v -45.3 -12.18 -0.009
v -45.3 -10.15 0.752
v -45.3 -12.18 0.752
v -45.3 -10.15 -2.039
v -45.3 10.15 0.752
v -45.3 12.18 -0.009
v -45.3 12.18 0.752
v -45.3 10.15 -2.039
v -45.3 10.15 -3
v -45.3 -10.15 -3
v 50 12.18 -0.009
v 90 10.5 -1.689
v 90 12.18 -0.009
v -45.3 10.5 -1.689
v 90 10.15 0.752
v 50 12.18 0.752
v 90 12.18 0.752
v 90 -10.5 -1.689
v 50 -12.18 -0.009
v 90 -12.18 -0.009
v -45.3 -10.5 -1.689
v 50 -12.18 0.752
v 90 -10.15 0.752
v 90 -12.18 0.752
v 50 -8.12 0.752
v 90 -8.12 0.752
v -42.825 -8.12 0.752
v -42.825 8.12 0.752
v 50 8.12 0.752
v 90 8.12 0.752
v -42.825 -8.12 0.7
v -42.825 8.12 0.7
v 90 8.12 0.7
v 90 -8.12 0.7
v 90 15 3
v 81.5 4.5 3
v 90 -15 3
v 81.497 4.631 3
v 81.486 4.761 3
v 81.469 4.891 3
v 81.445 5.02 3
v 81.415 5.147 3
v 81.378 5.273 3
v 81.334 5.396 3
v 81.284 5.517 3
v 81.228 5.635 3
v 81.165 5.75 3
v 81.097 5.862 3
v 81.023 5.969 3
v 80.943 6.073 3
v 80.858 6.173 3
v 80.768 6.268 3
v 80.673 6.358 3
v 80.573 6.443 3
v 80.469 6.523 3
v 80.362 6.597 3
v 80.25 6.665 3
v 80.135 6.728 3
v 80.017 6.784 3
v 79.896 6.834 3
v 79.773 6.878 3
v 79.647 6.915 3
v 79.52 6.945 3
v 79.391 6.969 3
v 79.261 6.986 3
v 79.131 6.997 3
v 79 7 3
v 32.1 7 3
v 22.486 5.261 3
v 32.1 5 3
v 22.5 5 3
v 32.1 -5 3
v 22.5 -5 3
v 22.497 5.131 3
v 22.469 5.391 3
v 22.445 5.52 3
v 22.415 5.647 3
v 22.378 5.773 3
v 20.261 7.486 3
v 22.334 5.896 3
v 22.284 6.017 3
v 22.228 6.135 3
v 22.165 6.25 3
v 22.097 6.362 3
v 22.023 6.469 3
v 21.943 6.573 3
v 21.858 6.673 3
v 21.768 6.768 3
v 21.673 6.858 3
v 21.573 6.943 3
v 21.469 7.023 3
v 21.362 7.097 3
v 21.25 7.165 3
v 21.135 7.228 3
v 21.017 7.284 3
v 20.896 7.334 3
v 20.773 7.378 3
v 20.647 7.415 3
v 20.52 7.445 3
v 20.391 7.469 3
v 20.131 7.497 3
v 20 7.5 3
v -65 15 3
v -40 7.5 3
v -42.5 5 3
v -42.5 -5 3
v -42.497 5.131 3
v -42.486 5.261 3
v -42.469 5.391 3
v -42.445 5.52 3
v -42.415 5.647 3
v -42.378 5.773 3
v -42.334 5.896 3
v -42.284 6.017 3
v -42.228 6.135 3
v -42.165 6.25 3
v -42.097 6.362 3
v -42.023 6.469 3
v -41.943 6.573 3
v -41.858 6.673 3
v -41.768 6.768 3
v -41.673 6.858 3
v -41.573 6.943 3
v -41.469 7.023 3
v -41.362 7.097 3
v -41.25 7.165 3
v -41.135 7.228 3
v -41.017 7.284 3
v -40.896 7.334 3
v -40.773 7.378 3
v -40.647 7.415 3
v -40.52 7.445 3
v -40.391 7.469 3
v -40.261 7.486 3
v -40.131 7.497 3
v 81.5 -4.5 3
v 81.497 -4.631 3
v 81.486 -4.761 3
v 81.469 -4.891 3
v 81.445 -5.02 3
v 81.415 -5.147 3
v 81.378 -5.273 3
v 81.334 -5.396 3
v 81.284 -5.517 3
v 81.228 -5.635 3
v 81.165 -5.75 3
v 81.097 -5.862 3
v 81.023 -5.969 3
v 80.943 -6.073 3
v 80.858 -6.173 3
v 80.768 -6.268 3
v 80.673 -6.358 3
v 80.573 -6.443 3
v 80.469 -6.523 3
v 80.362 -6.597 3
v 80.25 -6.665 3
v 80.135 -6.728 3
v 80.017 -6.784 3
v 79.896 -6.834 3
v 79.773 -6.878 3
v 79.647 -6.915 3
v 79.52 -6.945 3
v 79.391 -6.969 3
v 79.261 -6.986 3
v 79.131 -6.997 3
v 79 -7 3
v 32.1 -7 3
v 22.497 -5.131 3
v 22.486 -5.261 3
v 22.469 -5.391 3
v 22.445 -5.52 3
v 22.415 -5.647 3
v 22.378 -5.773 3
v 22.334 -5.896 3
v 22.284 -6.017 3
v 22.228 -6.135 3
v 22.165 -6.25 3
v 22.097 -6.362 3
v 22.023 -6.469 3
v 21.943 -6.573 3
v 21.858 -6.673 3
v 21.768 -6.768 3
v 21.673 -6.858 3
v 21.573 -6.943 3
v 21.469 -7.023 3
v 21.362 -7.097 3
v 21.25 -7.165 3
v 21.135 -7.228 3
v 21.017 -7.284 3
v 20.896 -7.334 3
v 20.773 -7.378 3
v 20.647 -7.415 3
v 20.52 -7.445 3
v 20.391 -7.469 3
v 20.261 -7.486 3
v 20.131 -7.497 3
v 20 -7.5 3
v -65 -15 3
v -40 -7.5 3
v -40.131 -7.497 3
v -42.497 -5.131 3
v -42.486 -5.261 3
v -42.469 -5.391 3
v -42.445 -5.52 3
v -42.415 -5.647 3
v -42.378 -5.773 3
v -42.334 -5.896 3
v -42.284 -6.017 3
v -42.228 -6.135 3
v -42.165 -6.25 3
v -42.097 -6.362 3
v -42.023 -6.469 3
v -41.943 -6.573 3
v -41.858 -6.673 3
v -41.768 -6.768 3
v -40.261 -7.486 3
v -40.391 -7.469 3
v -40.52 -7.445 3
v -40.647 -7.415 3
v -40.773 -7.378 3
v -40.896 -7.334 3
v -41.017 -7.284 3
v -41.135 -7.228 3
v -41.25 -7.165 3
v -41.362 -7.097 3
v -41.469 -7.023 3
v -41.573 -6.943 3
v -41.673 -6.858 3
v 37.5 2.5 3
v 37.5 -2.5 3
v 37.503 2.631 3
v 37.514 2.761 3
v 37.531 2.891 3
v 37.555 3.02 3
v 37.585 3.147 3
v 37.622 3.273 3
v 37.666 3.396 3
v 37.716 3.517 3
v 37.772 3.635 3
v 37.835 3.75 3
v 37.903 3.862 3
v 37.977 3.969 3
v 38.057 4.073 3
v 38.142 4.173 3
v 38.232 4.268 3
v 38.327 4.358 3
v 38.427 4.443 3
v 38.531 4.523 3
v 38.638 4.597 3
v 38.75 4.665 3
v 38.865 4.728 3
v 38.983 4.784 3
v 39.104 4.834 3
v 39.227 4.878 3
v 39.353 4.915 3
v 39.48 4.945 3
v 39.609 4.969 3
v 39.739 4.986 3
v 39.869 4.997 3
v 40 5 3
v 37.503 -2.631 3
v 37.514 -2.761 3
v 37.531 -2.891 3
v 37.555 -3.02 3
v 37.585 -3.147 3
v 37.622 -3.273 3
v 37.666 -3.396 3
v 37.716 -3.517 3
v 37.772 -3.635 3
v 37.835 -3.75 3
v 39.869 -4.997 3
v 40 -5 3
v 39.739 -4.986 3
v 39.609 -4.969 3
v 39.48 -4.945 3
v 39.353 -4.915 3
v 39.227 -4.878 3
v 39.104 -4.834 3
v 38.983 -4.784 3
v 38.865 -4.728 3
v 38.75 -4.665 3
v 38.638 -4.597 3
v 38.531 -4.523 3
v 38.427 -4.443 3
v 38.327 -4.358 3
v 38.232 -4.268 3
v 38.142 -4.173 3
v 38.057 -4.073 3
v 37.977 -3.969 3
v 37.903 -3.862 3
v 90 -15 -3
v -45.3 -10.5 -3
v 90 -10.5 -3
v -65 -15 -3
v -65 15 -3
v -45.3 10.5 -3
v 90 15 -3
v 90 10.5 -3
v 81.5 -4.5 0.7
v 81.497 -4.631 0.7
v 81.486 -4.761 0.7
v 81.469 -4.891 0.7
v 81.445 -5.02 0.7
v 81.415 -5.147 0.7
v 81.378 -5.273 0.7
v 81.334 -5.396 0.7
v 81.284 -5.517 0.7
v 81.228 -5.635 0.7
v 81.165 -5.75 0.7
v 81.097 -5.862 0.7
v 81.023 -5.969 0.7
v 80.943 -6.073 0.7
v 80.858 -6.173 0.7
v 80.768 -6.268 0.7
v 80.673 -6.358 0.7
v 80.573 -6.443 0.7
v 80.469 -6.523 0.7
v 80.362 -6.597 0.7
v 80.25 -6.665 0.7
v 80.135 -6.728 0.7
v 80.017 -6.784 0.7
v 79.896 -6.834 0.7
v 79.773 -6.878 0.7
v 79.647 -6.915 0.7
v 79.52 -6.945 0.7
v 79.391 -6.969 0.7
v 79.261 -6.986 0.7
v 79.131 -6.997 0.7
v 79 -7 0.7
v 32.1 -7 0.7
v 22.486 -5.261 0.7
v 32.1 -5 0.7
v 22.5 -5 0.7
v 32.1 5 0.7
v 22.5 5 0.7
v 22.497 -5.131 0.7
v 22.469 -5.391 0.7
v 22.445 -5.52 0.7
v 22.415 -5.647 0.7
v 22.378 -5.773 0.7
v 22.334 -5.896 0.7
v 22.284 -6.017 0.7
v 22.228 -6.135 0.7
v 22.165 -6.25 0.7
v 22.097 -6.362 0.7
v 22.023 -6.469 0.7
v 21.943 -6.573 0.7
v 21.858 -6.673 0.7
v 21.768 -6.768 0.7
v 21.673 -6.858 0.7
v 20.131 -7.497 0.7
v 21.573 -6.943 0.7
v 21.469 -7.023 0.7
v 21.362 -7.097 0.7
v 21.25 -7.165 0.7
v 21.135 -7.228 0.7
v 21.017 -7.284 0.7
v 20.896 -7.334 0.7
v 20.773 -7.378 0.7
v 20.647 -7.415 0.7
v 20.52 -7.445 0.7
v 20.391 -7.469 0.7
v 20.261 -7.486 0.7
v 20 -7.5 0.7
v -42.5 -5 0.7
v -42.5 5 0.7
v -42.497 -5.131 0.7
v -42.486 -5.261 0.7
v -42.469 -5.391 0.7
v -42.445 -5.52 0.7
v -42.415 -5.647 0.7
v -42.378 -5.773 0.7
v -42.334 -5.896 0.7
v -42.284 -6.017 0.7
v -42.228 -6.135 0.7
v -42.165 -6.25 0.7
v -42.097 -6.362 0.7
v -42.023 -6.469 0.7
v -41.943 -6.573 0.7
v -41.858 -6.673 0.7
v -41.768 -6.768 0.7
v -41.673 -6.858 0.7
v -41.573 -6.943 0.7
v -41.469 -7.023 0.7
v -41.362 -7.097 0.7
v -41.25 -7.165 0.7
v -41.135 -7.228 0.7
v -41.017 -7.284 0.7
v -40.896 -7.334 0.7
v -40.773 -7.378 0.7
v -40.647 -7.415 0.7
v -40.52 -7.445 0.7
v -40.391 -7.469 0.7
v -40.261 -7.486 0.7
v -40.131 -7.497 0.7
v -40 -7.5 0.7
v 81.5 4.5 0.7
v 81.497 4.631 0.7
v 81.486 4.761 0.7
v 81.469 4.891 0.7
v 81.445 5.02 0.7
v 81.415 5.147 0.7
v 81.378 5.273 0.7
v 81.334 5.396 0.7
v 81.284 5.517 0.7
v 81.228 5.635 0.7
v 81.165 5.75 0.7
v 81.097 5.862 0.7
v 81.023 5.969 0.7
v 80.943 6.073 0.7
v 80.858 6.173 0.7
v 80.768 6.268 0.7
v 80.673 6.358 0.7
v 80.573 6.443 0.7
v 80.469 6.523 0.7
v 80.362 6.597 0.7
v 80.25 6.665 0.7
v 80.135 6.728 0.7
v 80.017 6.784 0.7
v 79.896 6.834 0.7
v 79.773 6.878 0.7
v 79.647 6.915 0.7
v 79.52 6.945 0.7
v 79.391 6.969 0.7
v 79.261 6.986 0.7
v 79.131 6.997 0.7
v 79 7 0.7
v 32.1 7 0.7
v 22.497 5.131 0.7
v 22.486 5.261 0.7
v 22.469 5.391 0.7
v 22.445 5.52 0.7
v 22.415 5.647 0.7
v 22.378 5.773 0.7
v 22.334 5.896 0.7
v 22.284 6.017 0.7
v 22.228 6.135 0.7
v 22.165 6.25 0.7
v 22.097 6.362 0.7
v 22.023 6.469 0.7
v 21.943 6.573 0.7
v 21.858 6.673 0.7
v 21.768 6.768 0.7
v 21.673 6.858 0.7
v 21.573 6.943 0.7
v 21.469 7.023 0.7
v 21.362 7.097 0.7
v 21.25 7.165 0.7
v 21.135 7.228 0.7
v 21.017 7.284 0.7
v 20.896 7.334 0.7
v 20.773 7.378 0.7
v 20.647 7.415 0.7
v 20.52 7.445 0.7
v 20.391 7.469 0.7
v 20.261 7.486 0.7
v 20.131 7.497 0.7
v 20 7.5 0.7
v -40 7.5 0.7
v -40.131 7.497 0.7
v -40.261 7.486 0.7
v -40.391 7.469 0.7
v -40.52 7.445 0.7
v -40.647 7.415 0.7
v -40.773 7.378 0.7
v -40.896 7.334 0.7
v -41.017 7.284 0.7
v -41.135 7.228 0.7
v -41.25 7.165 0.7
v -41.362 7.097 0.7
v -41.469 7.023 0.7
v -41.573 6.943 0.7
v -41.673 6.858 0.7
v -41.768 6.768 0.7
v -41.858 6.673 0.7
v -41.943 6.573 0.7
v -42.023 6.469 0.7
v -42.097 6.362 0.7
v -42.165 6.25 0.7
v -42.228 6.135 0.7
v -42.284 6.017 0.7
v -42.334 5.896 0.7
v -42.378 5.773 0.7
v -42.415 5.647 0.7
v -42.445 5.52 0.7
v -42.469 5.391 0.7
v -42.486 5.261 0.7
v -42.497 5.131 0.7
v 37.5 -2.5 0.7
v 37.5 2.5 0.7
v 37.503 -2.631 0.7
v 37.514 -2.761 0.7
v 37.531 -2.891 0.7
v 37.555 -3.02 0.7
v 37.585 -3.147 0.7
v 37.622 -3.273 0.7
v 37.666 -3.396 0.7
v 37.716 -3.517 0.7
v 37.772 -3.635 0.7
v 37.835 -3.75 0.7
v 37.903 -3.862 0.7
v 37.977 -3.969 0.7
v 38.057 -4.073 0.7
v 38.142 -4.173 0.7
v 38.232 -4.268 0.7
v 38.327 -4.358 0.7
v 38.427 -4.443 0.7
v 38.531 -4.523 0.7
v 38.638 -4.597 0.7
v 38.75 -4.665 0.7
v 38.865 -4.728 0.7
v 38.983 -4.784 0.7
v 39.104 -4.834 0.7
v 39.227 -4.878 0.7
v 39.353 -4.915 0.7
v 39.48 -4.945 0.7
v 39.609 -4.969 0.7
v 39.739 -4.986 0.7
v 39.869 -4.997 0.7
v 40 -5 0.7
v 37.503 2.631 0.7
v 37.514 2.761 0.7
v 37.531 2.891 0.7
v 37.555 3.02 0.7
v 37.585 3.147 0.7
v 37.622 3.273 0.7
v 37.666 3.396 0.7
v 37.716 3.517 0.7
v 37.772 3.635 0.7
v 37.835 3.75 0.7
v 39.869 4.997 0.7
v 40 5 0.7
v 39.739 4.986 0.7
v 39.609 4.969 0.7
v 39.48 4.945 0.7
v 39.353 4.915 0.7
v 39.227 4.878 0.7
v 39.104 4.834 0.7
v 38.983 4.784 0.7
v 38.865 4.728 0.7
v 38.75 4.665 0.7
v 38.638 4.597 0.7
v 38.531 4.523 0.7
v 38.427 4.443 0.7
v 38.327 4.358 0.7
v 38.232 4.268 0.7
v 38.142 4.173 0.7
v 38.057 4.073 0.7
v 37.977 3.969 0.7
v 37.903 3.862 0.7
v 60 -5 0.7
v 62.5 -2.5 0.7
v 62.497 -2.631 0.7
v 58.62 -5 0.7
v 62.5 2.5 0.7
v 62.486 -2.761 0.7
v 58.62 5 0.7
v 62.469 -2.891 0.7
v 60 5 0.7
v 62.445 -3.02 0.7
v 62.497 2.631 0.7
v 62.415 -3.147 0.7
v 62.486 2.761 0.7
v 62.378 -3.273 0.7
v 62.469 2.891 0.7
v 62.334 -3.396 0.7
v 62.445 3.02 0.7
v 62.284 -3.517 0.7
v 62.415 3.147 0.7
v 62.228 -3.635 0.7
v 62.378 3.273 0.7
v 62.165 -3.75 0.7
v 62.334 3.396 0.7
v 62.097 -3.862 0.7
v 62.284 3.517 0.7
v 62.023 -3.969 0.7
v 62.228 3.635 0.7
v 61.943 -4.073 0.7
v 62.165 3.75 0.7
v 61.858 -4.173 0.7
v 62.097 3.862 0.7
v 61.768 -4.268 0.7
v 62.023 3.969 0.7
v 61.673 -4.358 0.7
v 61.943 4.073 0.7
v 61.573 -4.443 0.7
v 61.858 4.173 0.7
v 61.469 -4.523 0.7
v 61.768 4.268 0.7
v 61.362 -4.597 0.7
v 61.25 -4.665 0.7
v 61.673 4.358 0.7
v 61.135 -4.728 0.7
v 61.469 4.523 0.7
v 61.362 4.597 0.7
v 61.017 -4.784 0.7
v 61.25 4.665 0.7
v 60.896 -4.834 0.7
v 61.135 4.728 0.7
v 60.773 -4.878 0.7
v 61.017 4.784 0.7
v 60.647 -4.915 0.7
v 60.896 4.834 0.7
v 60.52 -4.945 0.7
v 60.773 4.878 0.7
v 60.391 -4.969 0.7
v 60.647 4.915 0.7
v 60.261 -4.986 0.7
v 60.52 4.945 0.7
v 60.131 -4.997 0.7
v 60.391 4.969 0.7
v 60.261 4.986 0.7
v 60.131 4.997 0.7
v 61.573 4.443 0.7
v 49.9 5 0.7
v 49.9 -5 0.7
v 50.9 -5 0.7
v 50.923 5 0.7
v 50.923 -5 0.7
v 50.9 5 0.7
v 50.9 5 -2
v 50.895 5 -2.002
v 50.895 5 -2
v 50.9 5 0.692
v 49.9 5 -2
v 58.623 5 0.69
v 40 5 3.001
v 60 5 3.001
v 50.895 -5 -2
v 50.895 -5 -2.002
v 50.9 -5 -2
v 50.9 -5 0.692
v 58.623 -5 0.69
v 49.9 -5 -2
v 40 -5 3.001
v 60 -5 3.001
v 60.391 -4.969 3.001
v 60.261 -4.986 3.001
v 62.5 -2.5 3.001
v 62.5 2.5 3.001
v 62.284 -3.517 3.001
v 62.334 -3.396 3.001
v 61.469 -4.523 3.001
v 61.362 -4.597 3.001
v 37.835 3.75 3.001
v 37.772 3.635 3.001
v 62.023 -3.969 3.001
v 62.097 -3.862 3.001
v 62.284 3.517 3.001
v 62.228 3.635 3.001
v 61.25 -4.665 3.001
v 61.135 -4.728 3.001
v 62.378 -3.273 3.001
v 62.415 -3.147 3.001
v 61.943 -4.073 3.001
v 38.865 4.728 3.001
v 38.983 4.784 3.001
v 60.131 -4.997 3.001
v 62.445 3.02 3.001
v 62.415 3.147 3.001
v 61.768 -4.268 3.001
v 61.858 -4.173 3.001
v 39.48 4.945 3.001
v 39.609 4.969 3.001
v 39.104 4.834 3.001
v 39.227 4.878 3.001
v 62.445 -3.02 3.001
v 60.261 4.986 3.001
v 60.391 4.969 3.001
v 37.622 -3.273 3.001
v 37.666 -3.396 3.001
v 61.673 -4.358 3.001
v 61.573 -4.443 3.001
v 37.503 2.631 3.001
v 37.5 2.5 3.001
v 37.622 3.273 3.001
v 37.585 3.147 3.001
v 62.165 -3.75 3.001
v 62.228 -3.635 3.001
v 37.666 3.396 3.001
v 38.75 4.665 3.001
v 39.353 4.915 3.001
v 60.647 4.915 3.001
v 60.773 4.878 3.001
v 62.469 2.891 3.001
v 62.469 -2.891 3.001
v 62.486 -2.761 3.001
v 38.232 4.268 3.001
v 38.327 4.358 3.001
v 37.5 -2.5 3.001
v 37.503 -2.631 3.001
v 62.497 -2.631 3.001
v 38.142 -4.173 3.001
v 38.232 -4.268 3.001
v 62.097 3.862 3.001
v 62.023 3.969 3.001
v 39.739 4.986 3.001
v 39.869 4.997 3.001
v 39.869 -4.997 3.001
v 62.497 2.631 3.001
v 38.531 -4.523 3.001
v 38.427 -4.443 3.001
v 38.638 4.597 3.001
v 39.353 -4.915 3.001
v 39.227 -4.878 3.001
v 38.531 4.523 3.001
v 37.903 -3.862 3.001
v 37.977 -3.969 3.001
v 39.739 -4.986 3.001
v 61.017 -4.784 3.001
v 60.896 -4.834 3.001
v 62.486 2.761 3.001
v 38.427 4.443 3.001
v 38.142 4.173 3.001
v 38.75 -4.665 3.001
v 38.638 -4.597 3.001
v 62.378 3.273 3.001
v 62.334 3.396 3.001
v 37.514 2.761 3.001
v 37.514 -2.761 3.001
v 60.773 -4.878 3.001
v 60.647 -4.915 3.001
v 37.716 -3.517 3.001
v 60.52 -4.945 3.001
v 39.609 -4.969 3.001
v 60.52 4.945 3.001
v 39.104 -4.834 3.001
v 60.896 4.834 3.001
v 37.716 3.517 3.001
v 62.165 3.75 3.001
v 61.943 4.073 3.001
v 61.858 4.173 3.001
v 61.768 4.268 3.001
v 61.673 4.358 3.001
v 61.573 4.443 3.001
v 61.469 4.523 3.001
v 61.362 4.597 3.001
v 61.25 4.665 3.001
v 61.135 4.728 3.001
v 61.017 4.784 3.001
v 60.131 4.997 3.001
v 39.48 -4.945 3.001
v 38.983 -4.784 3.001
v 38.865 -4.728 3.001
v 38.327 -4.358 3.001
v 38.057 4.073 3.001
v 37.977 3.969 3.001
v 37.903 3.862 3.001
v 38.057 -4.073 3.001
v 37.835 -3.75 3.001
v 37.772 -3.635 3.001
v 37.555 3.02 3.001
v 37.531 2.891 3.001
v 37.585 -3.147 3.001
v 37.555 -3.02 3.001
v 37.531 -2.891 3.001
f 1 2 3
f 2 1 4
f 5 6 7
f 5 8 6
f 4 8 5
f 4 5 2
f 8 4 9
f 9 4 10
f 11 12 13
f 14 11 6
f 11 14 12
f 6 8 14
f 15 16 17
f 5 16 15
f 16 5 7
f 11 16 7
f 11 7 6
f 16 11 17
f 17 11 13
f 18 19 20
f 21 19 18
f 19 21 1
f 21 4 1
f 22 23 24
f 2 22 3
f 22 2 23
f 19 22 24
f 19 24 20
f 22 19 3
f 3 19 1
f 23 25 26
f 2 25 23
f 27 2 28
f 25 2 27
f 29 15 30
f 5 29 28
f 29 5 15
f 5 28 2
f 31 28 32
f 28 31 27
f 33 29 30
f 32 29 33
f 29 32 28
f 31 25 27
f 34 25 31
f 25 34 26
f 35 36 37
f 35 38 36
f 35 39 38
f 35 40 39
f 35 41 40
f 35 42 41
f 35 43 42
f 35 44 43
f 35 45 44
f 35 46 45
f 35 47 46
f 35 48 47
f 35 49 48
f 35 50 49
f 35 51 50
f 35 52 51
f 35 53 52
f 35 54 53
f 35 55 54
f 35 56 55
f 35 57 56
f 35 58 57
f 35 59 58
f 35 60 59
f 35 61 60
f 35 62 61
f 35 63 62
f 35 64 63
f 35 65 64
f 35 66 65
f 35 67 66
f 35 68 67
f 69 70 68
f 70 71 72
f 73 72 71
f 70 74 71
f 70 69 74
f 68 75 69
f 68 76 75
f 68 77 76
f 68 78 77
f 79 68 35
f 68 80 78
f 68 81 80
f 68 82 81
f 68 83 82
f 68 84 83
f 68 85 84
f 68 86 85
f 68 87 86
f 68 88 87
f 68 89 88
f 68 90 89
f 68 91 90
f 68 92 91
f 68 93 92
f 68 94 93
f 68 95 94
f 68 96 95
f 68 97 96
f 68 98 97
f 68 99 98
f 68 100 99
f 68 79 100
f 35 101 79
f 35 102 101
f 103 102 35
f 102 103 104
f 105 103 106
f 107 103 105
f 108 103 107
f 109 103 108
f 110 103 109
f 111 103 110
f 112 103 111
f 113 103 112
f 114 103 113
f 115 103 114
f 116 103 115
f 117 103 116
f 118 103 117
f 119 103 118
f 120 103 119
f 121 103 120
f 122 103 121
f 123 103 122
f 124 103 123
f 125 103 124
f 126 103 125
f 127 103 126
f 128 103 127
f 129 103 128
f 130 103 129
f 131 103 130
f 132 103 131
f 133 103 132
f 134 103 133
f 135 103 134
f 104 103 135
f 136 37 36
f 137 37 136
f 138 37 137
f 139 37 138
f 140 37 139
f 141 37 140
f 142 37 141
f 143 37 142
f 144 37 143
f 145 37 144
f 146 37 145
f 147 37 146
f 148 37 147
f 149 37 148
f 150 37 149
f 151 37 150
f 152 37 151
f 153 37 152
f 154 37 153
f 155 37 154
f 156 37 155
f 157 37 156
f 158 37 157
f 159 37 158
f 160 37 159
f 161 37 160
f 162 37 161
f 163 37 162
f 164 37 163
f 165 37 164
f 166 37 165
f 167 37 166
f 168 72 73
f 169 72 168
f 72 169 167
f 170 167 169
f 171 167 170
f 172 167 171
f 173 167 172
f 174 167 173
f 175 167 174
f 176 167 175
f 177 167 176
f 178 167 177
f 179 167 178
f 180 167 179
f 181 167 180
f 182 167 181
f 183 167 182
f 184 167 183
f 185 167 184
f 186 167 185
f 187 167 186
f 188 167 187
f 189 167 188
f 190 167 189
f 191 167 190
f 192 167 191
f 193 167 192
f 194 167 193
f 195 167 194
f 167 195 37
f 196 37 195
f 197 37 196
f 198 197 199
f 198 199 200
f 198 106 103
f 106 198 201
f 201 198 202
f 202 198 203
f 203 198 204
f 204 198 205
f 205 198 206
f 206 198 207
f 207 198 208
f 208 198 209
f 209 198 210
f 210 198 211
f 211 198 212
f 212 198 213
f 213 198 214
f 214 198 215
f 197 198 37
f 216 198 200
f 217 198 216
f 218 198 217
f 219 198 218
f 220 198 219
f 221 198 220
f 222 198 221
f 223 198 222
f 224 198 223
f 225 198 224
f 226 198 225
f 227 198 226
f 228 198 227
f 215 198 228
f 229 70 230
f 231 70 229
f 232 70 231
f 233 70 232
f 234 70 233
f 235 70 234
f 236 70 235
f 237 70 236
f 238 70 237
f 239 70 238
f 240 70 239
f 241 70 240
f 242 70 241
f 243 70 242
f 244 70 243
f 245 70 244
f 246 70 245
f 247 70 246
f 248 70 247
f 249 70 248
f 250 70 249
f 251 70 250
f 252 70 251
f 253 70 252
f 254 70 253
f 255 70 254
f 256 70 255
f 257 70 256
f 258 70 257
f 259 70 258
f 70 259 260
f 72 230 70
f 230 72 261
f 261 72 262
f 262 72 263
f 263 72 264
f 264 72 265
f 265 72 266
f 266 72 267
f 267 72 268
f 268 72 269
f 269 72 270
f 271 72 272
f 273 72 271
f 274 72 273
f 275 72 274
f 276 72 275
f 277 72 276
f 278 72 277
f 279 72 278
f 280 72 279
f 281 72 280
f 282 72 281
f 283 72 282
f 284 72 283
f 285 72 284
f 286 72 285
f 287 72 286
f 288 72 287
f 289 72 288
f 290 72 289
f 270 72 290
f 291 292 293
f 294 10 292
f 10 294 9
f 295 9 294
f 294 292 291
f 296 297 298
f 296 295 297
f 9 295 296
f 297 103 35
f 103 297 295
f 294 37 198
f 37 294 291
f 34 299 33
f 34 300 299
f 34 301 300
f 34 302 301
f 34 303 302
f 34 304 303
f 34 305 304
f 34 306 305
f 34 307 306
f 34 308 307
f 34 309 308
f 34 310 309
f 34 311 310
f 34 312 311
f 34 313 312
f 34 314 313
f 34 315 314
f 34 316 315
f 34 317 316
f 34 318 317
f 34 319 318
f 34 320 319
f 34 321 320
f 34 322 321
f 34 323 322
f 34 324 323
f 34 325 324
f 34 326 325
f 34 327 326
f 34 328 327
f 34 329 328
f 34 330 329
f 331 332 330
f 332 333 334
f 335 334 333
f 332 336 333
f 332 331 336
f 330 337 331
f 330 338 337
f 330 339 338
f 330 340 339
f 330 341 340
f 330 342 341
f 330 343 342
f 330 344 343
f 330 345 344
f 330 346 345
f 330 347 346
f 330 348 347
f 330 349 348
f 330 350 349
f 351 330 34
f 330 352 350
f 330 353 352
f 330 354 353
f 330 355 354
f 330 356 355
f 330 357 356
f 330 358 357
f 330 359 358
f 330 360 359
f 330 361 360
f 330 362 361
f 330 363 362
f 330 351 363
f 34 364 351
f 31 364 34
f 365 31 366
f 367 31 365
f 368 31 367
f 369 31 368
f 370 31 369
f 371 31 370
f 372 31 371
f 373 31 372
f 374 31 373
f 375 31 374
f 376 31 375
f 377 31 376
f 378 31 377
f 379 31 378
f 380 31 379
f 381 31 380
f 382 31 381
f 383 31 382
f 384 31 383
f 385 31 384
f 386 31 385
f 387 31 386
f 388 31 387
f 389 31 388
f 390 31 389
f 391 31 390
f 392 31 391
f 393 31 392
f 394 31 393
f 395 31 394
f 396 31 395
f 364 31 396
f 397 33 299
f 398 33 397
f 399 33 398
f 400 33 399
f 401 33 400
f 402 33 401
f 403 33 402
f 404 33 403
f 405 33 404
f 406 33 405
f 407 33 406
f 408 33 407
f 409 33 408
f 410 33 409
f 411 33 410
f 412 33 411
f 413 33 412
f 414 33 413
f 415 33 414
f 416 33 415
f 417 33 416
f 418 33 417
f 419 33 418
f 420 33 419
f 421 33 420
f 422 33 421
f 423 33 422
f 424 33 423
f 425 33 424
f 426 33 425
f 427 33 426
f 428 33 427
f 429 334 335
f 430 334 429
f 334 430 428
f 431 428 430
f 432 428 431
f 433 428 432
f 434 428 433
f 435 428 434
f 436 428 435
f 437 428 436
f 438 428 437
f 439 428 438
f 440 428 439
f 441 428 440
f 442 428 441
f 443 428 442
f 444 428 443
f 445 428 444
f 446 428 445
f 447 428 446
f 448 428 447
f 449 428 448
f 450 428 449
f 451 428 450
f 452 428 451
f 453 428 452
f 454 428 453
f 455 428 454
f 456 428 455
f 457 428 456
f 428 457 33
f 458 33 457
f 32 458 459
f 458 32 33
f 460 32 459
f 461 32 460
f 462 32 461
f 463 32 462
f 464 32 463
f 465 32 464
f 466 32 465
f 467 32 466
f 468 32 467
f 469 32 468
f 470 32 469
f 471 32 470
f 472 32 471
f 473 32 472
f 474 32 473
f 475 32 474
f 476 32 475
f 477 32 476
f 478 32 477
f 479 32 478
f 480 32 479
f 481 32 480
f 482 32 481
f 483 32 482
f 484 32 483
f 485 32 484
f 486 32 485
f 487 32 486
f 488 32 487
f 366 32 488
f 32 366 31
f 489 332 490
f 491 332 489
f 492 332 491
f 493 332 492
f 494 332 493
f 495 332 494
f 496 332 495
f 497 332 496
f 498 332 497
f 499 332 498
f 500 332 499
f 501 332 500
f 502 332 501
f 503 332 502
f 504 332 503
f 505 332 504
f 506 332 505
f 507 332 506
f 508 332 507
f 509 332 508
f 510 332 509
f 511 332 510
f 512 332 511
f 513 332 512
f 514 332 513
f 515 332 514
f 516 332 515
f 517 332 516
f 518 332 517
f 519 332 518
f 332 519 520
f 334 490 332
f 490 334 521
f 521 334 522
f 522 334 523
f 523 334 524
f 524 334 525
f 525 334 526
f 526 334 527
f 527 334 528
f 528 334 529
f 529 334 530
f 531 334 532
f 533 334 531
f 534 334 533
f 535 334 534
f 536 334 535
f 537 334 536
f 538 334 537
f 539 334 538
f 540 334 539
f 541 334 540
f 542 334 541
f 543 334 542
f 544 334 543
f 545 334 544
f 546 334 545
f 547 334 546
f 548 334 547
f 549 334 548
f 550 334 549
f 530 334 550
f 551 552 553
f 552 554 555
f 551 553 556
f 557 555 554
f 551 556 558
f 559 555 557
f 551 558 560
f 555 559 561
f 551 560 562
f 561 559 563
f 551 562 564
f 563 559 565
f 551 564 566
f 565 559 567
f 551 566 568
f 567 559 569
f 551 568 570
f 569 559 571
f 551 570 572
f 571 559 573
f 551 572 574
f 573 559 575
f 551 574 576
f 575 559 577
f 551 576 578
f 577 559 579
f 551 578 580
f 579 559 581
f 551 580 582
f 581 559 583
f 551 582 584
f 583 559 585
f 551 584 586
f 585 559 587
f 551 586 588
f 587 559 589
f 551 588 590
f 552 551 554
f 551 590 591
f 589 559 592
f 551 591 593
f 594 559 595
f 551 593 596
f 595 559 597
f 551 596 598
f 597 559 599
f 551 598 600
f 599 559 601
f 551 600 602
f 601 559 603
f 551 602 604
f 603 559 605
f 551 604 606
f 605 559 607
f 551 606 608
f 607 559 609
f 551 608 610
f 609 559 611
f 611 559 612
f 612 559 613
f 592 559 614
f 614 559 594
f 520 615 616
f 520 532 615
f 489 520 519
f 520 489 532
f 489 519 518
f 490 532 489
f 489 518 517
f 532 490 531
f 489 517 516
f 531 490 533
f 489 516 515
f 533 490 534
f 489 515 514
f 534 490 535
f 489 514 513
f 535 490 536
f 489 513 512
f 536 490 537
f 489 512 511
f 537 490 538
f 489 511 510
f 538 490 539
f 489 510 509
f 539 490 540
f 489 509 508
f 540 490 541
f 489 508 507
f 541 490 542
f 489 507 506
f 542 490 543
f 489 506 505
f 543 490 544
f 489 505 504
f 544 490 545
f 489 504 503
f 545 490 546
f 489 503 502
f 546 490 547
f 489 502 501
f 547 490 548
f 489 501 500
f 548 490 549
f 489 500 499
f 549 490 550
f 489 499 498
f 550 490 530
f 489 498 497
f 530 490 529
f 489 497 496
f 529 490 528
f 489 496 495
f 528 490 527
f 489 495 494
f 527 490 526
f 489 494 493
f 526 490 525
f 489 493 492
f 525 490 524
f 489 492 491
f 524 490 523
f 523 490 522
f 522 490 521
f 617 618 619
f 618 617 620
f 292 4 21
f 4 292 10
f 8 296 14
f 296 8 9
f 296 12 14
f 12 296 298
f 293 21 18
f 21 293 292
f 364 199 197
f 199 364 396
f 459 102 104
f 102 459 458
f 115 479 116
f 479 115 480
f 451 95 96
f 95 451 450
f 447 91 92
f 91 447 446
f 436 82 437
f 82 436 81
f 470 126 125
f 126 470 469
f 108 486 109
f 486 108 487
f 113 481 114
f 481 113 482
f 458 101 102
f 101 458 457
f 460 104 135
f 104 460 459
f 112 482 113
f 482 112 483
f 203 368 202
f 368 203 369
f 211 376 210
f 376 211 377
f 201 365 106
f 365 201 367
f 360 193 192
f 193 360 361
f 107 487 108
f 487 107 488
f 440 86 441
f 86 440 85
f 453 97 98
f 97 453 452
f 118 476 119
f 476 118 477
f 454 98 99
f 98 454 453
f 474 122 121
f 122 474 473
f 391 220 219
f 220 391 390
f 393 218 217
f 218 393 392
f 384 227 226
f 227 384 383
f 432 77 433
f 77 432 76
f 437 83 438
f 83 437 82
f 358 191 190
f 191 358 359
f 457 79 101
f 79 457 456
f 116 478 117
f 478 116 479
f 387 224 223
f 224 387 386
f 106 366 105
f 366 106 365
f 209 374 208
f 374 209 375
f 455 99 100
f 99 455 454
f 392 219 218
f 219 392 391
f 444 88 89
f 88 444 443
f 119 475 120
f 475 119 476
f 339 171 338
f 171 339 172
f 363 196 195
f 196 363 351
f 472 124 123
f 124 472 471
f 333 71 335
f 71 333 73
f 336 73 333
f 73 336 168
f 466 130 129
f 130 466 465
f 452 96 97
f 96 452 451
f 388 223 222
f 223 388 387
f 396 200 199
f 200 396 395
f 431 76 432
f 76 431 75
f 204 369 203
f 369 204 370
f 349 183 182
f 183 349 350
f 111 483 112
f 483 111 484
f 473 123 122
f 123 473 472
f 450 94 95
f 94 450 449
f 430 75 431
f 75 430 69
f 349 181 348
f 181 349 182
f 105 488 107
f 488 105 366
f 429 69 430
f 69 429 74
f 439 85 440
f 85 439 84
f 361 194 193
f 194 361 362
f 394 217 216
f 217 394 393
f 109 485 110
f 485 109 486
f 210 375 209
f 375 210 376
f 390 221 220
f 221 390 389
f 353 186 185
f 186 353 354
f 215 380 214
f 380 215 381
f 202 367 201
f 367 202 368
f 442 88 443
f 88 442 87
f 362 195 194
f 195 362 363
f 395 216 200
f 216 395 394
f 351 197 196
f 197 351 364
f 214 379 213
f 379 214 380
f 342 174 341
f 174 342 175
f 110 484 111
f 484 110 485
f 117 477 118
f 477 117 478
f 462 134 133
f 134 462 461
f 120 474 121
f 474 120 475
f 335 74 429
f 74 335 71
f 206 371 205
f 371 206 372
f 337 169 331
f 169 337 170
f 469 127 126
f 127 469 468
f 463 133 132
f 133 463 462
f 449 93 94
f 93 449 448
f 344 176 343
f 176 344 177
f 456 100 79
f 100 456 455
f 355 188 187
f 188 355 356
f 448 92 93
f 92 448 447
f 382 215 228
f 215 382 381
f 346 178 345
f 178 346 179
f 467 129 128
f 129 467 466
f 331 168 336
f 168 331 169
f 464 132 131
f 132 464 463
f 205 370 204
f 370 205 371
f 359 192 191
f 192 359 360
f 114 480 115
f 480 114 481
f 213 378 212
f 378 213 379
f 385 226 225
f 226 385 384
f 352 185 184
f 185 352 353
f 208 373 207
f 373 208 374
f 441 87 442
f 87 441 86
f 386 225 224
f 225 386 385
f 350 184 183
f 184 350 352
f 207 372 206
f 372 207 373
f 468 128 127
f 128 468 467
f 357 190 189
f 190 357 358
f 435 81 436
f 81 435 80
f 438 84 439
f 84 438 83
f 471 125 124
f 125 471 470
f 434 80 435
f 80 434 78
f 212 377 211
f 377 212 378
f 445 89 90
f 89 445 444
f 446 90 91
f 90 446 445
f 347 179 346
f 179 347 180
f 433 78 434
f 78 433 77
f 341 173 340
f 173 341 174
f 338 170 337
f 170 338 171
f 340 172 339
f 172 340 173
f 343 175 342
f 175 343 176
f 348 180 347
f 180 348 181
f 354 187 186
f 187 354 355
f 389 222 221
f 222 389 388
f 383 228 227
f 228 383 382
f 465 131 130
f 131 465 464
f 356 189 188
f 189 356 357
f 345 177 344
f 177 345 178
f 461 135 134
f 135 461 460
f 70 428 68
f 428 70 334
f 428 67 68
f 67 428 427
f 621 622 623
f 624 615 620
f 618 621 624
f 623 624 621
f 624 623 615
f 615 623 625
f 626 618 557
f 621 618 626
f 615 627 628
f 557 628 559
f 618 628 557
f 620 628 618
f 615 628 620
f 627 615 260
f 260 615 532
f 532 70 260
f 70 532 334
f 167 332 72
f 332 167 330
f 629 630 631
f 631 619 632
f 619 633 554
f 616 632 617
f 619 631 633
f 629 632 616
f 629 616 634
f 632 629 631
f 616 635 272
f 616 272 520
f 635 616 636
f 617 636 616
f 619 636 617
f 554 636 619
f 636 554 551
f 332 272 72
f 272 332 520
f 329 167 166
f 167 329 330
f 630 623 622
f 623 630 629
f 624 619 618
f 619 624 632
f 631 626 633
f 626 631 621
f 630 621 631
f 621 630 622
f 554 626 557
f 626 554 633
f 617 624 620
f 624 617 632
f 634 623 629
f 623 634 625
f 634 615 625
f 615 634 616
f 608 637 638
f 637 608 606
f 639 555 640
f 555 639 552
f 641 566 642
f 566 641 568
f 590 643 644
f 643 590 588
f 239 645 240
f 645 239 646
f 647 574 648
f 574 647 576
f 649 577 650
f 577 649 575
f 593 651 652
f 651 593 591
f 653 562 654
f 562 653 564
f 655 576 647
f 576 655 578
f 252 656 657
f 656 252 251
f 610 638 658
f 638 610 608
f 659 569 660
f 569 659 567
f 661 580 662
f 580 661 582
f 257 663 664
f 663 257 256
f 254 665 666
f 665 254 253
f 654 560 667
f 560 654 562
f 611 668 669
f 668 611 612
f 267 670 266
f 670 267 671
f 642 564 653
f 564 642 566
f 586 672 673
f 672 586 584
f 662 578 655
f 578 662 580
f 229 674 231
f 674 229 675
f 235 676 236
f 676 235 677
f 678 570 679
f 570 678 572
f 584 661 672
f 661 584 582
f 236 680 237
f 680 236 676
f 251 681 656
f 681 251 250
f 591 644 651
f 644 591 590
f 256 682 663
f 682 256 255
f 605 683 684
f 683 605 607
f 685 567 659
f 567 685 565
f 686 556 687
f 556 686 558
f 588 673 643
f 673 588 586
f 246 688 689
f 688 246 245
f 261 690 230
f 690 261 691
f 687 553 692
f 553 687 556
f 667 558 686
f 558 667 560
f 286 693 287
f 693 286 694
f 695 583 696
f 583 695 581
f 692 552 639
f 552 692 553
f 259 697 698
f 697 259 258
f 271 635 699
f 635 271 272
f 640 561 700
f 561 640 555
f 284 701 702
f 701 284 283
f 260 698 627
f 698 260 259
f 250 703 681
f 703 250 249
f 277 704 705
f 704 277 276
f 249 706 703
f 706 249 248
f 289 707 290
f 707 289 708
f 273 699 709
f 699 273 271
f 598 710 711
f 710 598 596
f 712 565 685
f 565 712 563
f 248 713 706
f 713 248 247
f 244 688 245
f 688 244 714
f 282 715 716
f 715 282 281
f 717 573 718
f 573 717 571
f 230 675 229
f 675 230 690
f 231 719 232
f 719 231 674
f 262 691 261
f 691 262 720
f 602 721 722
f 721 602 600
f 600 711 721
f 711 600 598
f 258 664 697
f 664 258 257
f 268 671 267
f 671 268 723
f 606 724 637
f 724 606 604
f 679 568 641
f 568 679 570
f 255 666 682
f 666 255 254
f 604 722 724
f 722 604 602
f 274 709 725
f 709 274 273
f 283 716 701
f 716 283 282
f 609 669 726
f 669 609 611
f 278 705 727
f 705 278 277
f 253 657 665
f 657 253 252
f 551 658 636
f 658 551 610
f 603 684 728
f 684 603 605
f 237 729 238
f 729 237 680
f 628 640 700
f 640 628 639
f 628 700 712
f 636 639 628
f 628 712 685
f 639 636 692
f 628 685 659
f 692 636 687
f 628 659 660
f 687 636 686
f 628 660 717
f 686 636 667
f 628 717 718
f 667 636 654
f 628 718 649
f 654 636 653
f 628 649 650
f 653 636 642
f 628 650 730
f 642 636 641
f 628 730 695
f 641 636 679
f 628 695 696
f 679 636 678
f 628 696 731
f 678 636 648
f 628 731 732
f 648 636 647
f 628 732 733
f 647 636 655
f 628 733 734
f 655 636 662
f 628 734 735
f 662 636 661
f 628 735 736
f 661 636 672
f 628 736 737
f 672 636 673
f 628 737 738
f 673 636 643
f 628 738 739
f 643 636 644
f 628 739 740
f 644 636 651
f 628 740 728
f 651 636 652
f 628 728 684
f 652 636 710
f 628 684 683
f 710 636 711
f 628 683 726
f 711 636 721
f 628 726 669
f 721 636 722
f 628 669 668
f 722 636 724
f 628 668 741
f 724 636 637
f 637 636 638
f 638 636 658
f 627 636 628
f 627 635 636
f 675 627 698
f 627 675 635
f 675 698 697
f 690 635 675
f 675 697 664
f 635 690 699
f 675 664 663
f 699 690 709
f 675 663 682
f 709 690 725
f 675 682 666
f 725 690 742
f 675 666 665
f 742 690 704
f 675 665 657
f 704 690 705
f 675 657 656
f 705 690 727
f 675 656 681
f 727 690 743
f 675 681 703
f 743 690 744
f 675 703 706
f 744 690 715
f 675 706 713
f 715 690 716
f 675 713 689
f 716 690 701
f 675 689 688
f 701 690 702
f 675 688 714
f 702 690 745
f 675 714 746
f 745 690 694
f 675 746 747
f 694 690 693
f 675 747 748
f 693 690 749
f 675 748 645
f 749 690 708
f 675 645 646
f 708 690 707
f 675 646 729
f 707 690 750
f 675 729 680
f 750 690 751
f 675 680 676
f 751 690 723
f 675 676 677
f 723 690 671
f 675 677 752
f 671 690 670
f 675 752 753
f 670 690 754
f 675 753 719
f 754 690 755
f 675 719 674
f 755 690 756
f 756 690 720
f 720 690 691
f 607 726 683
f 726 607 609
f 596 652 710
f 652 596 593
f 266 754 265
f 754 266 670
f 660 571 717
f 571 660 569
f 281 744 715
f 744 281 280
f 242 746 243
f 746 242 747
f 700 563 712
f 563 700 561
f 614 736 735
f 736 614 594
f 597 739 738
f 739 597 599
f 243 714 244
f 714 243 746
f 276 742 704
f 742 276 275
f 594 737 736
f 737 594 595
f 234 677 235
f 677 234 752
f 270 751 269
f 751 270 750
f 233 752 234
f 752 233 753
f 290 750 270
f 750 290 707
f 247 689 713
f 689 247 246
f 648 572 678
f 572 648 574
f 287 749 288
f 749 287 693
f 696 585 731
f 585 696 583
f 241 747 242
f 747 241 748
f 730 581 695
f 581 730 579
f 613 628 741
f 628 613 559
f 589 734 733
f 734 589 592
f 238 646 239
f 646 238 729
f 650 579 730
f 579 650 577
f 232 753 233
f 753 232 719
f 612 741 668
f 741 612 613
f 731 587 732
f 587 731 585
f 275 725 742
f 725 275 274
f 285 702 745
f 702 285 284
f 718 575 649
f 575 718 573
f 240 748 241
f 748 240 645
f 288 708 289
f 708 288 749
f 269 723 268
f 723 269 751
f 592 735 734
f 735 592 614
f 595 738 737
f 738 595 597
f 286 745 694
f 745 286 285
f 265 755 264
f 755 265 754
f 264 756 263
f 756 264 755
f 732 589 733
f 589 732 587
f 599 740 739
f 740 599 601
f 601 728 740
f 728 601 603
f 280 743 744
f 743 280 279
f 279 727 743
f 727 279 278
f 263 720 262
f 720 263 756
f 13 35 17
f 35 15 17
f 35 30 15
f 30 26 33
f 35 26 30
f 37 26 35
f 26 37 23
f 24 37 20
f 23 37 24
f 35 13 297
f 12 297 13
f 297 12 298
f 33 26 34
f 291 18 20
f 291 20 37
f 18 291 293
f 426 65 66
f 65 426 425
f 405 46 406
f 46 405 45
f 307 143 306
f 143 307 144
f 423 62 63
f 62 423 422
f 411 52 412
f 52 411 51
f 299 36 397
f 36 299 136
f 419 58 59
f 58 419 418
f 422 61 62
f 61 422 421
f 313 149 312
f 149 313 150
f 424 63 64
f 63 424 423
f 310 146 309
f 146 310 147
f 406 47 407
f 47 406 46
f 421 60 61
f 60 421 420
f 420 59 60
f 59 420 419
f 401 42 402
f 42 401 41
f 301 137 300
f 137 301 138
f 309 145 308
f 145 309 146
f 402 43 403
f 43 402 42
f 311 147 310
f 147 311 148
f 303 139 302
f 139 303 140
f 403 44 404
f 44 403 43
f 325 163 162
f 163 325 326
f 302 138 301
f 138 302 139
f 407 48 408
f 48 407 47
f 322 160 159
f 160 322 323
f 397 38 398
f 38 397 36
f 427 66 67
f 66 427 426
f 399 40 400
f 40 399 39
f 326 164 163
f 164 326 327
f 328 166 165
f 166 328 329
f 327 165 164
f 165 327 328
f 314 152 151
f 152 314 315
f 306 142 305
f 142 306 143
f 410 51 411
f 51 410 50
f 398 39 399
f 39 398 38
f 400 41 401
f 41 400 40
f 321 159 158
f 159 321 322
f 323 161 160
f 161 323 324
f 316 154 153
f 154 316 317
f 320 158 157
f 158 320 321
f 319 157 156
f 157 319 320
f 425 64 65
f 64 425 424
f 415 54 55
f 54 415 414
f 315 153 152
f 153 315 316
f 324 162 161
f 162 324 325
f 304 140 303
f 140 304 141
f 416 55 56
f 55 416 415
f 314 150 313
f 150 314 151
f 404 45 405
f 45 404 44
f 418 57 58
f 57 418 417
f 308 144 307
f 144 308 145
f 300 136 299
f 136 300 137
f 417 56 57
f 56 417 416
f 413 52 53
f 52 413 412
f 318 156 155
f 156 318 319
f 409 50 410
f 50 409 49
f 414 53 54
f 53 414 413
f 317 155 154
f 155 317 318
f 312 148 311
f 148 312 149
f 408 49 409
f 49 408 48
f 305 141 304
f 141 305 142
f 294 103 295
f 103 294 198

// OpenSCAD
$fn = $preview ? 45 : 120;

bolt = 5; // M5
hammock_mount();
//hammock_clamp_top();
//hammock_clamp_bottom();

//#translate([55, 0, -2.8]) frame_mount();
//frame_mount();
//spacer();

module hammock_mount() {
    width = 120;
    diameter = 100;
    
    removable_mount();
    
    translate([-57, 0, 0]) cube([16, 30, 6], true);
    translate([70, 0, 0]) difference() {
        cube([40, 30, 6], true);
        translate([-20, 0, -2.8]) scale([1.1, 1.015, 1.015]) frame_mount(false, false);
        translate([0, 0, -1.8]) cube([50, 21, 5], true);
        translate([-6, 0, 1]) minkowski() {
            cube([30, 9, 5], true);
            cylinder(d = 5, h = 1);
        }
    }
    
}
    
module hammock_clamp_top() {
    difference() {
        translate([0, 0, 0]) {
            cube([16, 38, 11], true);
            translate([-8, 0, -50]) rotate([0, 90, 0]) difference() {
                cylinder(d = 100, h = 16);
                translate([0, 0, -1]) cylinder(d = 94, h = 18);
                translate([0, -50, -1]) cube([200, 100, 20]);
                translate([-5, -75, 3]) cube([2, 140, 10]);
            }
        }
        translate([14, 0, 0]) scale([1.01, 1.01, 1.01]) #cube([40, 30, 6], true);
    }
}

module hammock_clamp_bottom() {
    difference() {
        translate([0, 0, 0]) {
            cube([16, 40, 12], true);
            translate([-8, 0, -50]) rotate([0, 90, 0]) difference() {
                cylinder(d = 100, h = 16);
                translate([0, 0, -1]) cylinder(d = 94, h = 18);
                translate([0, -50, -1]) cube([200, 100, 20]);
                translate([-5, -75, 3]) cube([2, 140, 10]);
            }
        }
        translate([10, 0, 0]) scale([1.01, 1.01, 1.01]) cube([40, 30, 6], true);
        translate([10, 0, 5]) scale([1.01, 1.01, 1.01]) cube([40, 21, 6], true);
    }
}

module removable_mount() {
    w = 100 - 0.4;
    difference() {
        cube([100, 30, 6], true);
        translate([4.2, 0, -2.8]) scale([1.1, 1.015, 1.015]) frame_mount(false, false);
        translate([4.5, 0, -1.8]) cube([w, 21, 5], true);
        translate([-10, 0, 1]) minkowski() {
            cube([60, 10, 5], true);
            cylinder(d = 5, h = 1);
        }
        
        // Cutoffs
        translate([42.1, 6, 1]) cube([20, 2, 5], true);
        translate([42.1, -6, 1]) cube([20, 2, 5], true);
    }
    translate([50, 0, 1.85]) {
        minkowski() {
            cube([20, 5, 2.3], true);
            cylinder(d = 5, h = 0.001);
        }
    }
    translate([54.5, 0, 0.6]) {
        scale([1, 1, 1.3]) {
            difference() {
                rotate([0, -15, 0]) {
                    cube([8, 10, 2], true);
                }
                translate([3, 0, 2.5]) cube([3, 12, 2], true);
            }
            translate([-4.1, 0, -0.5]) cube([1, 10, 3], true);
        }
    }
}

module spacer() {
    difference() {
        cylinder(d = 10, h = 1);
        translate([0, 0, -1]) cylinder(d = 5.2, h = 4);
    }
}

module frame_mount(angle_rake = true, round_edge = true) {
    difference() {
        translate([0, 0, 0]) {
            inset(round_edge);
            translate([-45, 10, 0.75]) rake();
            translate([-45, -10, 0.75]) mirror([0, -1, 0]) rake();
            
            if (angle_rake) {
                angle_rake();
                mirror([0, -1, 0]) angle_rake();
            }
        }

        translate([0, 0, 2]) scale([0.95, 0.8, 1]) {
            inset(round_edge);
        }

        bolts();
        translate([-52.51, 0, 0]) cube([5, 30, 10], true);
    }
}

module angle_rake() {
    translate([-46.3, 9.55, 0.75]) rotate([0, 0, 15]) rake(2);
    translate([-47.3, 8.85, 0.75]) rotate([0, 0, 30]) rake(2);
    translate([-48.3, 7.8, 0.75]) rotate([0, 0, 45]) rake(2);
    translate([-49.0, 6.5, 0.75]) rotate([0, 0, 60]) rake(2);
    translate([-49.23, 5.2, 0.75]) rotate([0, 0, 75]) rake(2);
    translate([-49.15, -0.8, 0.75]) rotate([0, 0, 90]) rake(6.5);
}

module rake(size = 90) {
    difference() {
        rotate([45, 0, 0]) cube([size, 4, 4]);
        translate([-1, -4, 2.75]) cube([size + 2, 8, 4]);
        translate([-1, -4, -4]) cube([size + 2, 4, 8]);
        translate([-1, 2, -4]) cube([size + 2, 4, 8]);
    }
}

module round_edge_rt(diameter = 10, t = 7) {
    difference() { 
        translate([0, 0, -(t / 2)]) cylinder(d = diameter, h = t);
        translate([0, -((diameter + 1) / 2), 0]) cube(diameter + 1, true);
        translate([((diameter + 1) / 2), 0, -0]) cube(diameter + 1, true);
    }
}
module round_edge_lt(diameter = 10, t = 7) {
    difference() { 
        translate([0, 0, -(t / 2)]) cylinder(d = diameter, h = t);
        translate([0, ((diameter + 1) / 2), 0]) cube(diameter + 1, true);
        translate([((diameter + 1) / 2), 0, 0]) cube(diameter + 1, true);
    }
}

module inset(round_edge = true) {
    cube([90, 20, 7], true);
    if (round_edge) {
        translate([-45, 0, 0]) cube([10, 10, 7], true);
        translate([-45, 5, 0]) round_edge_rt();
        translate([-45, -5, 0]) round_edge_lt();
    }
}

module m5_bolt() {
    translate([0, 0, 12]) cylinder(d = 10, h = 5);
    cylinder(d = 5, h = 12);
}

module bolts() {
    holeOffset = 0;
    translate([holeOffset + (64 / 2), 0, -10]) {
        bolt_hole();
    }
    translate([holeOffset + (-64 / 2), 0, -10]) {
        bolt_hole();
    }
}

module bolt_hole() {
    translate([-1, 0, 0]) cylinder(h = 20, d = bolt);
    translate([-1, -(bolt / 2), 0]) cube([2, bolt, 20]);
    translate([1, 0, 0]) cylinder(h = 20, d = bolt);
}
